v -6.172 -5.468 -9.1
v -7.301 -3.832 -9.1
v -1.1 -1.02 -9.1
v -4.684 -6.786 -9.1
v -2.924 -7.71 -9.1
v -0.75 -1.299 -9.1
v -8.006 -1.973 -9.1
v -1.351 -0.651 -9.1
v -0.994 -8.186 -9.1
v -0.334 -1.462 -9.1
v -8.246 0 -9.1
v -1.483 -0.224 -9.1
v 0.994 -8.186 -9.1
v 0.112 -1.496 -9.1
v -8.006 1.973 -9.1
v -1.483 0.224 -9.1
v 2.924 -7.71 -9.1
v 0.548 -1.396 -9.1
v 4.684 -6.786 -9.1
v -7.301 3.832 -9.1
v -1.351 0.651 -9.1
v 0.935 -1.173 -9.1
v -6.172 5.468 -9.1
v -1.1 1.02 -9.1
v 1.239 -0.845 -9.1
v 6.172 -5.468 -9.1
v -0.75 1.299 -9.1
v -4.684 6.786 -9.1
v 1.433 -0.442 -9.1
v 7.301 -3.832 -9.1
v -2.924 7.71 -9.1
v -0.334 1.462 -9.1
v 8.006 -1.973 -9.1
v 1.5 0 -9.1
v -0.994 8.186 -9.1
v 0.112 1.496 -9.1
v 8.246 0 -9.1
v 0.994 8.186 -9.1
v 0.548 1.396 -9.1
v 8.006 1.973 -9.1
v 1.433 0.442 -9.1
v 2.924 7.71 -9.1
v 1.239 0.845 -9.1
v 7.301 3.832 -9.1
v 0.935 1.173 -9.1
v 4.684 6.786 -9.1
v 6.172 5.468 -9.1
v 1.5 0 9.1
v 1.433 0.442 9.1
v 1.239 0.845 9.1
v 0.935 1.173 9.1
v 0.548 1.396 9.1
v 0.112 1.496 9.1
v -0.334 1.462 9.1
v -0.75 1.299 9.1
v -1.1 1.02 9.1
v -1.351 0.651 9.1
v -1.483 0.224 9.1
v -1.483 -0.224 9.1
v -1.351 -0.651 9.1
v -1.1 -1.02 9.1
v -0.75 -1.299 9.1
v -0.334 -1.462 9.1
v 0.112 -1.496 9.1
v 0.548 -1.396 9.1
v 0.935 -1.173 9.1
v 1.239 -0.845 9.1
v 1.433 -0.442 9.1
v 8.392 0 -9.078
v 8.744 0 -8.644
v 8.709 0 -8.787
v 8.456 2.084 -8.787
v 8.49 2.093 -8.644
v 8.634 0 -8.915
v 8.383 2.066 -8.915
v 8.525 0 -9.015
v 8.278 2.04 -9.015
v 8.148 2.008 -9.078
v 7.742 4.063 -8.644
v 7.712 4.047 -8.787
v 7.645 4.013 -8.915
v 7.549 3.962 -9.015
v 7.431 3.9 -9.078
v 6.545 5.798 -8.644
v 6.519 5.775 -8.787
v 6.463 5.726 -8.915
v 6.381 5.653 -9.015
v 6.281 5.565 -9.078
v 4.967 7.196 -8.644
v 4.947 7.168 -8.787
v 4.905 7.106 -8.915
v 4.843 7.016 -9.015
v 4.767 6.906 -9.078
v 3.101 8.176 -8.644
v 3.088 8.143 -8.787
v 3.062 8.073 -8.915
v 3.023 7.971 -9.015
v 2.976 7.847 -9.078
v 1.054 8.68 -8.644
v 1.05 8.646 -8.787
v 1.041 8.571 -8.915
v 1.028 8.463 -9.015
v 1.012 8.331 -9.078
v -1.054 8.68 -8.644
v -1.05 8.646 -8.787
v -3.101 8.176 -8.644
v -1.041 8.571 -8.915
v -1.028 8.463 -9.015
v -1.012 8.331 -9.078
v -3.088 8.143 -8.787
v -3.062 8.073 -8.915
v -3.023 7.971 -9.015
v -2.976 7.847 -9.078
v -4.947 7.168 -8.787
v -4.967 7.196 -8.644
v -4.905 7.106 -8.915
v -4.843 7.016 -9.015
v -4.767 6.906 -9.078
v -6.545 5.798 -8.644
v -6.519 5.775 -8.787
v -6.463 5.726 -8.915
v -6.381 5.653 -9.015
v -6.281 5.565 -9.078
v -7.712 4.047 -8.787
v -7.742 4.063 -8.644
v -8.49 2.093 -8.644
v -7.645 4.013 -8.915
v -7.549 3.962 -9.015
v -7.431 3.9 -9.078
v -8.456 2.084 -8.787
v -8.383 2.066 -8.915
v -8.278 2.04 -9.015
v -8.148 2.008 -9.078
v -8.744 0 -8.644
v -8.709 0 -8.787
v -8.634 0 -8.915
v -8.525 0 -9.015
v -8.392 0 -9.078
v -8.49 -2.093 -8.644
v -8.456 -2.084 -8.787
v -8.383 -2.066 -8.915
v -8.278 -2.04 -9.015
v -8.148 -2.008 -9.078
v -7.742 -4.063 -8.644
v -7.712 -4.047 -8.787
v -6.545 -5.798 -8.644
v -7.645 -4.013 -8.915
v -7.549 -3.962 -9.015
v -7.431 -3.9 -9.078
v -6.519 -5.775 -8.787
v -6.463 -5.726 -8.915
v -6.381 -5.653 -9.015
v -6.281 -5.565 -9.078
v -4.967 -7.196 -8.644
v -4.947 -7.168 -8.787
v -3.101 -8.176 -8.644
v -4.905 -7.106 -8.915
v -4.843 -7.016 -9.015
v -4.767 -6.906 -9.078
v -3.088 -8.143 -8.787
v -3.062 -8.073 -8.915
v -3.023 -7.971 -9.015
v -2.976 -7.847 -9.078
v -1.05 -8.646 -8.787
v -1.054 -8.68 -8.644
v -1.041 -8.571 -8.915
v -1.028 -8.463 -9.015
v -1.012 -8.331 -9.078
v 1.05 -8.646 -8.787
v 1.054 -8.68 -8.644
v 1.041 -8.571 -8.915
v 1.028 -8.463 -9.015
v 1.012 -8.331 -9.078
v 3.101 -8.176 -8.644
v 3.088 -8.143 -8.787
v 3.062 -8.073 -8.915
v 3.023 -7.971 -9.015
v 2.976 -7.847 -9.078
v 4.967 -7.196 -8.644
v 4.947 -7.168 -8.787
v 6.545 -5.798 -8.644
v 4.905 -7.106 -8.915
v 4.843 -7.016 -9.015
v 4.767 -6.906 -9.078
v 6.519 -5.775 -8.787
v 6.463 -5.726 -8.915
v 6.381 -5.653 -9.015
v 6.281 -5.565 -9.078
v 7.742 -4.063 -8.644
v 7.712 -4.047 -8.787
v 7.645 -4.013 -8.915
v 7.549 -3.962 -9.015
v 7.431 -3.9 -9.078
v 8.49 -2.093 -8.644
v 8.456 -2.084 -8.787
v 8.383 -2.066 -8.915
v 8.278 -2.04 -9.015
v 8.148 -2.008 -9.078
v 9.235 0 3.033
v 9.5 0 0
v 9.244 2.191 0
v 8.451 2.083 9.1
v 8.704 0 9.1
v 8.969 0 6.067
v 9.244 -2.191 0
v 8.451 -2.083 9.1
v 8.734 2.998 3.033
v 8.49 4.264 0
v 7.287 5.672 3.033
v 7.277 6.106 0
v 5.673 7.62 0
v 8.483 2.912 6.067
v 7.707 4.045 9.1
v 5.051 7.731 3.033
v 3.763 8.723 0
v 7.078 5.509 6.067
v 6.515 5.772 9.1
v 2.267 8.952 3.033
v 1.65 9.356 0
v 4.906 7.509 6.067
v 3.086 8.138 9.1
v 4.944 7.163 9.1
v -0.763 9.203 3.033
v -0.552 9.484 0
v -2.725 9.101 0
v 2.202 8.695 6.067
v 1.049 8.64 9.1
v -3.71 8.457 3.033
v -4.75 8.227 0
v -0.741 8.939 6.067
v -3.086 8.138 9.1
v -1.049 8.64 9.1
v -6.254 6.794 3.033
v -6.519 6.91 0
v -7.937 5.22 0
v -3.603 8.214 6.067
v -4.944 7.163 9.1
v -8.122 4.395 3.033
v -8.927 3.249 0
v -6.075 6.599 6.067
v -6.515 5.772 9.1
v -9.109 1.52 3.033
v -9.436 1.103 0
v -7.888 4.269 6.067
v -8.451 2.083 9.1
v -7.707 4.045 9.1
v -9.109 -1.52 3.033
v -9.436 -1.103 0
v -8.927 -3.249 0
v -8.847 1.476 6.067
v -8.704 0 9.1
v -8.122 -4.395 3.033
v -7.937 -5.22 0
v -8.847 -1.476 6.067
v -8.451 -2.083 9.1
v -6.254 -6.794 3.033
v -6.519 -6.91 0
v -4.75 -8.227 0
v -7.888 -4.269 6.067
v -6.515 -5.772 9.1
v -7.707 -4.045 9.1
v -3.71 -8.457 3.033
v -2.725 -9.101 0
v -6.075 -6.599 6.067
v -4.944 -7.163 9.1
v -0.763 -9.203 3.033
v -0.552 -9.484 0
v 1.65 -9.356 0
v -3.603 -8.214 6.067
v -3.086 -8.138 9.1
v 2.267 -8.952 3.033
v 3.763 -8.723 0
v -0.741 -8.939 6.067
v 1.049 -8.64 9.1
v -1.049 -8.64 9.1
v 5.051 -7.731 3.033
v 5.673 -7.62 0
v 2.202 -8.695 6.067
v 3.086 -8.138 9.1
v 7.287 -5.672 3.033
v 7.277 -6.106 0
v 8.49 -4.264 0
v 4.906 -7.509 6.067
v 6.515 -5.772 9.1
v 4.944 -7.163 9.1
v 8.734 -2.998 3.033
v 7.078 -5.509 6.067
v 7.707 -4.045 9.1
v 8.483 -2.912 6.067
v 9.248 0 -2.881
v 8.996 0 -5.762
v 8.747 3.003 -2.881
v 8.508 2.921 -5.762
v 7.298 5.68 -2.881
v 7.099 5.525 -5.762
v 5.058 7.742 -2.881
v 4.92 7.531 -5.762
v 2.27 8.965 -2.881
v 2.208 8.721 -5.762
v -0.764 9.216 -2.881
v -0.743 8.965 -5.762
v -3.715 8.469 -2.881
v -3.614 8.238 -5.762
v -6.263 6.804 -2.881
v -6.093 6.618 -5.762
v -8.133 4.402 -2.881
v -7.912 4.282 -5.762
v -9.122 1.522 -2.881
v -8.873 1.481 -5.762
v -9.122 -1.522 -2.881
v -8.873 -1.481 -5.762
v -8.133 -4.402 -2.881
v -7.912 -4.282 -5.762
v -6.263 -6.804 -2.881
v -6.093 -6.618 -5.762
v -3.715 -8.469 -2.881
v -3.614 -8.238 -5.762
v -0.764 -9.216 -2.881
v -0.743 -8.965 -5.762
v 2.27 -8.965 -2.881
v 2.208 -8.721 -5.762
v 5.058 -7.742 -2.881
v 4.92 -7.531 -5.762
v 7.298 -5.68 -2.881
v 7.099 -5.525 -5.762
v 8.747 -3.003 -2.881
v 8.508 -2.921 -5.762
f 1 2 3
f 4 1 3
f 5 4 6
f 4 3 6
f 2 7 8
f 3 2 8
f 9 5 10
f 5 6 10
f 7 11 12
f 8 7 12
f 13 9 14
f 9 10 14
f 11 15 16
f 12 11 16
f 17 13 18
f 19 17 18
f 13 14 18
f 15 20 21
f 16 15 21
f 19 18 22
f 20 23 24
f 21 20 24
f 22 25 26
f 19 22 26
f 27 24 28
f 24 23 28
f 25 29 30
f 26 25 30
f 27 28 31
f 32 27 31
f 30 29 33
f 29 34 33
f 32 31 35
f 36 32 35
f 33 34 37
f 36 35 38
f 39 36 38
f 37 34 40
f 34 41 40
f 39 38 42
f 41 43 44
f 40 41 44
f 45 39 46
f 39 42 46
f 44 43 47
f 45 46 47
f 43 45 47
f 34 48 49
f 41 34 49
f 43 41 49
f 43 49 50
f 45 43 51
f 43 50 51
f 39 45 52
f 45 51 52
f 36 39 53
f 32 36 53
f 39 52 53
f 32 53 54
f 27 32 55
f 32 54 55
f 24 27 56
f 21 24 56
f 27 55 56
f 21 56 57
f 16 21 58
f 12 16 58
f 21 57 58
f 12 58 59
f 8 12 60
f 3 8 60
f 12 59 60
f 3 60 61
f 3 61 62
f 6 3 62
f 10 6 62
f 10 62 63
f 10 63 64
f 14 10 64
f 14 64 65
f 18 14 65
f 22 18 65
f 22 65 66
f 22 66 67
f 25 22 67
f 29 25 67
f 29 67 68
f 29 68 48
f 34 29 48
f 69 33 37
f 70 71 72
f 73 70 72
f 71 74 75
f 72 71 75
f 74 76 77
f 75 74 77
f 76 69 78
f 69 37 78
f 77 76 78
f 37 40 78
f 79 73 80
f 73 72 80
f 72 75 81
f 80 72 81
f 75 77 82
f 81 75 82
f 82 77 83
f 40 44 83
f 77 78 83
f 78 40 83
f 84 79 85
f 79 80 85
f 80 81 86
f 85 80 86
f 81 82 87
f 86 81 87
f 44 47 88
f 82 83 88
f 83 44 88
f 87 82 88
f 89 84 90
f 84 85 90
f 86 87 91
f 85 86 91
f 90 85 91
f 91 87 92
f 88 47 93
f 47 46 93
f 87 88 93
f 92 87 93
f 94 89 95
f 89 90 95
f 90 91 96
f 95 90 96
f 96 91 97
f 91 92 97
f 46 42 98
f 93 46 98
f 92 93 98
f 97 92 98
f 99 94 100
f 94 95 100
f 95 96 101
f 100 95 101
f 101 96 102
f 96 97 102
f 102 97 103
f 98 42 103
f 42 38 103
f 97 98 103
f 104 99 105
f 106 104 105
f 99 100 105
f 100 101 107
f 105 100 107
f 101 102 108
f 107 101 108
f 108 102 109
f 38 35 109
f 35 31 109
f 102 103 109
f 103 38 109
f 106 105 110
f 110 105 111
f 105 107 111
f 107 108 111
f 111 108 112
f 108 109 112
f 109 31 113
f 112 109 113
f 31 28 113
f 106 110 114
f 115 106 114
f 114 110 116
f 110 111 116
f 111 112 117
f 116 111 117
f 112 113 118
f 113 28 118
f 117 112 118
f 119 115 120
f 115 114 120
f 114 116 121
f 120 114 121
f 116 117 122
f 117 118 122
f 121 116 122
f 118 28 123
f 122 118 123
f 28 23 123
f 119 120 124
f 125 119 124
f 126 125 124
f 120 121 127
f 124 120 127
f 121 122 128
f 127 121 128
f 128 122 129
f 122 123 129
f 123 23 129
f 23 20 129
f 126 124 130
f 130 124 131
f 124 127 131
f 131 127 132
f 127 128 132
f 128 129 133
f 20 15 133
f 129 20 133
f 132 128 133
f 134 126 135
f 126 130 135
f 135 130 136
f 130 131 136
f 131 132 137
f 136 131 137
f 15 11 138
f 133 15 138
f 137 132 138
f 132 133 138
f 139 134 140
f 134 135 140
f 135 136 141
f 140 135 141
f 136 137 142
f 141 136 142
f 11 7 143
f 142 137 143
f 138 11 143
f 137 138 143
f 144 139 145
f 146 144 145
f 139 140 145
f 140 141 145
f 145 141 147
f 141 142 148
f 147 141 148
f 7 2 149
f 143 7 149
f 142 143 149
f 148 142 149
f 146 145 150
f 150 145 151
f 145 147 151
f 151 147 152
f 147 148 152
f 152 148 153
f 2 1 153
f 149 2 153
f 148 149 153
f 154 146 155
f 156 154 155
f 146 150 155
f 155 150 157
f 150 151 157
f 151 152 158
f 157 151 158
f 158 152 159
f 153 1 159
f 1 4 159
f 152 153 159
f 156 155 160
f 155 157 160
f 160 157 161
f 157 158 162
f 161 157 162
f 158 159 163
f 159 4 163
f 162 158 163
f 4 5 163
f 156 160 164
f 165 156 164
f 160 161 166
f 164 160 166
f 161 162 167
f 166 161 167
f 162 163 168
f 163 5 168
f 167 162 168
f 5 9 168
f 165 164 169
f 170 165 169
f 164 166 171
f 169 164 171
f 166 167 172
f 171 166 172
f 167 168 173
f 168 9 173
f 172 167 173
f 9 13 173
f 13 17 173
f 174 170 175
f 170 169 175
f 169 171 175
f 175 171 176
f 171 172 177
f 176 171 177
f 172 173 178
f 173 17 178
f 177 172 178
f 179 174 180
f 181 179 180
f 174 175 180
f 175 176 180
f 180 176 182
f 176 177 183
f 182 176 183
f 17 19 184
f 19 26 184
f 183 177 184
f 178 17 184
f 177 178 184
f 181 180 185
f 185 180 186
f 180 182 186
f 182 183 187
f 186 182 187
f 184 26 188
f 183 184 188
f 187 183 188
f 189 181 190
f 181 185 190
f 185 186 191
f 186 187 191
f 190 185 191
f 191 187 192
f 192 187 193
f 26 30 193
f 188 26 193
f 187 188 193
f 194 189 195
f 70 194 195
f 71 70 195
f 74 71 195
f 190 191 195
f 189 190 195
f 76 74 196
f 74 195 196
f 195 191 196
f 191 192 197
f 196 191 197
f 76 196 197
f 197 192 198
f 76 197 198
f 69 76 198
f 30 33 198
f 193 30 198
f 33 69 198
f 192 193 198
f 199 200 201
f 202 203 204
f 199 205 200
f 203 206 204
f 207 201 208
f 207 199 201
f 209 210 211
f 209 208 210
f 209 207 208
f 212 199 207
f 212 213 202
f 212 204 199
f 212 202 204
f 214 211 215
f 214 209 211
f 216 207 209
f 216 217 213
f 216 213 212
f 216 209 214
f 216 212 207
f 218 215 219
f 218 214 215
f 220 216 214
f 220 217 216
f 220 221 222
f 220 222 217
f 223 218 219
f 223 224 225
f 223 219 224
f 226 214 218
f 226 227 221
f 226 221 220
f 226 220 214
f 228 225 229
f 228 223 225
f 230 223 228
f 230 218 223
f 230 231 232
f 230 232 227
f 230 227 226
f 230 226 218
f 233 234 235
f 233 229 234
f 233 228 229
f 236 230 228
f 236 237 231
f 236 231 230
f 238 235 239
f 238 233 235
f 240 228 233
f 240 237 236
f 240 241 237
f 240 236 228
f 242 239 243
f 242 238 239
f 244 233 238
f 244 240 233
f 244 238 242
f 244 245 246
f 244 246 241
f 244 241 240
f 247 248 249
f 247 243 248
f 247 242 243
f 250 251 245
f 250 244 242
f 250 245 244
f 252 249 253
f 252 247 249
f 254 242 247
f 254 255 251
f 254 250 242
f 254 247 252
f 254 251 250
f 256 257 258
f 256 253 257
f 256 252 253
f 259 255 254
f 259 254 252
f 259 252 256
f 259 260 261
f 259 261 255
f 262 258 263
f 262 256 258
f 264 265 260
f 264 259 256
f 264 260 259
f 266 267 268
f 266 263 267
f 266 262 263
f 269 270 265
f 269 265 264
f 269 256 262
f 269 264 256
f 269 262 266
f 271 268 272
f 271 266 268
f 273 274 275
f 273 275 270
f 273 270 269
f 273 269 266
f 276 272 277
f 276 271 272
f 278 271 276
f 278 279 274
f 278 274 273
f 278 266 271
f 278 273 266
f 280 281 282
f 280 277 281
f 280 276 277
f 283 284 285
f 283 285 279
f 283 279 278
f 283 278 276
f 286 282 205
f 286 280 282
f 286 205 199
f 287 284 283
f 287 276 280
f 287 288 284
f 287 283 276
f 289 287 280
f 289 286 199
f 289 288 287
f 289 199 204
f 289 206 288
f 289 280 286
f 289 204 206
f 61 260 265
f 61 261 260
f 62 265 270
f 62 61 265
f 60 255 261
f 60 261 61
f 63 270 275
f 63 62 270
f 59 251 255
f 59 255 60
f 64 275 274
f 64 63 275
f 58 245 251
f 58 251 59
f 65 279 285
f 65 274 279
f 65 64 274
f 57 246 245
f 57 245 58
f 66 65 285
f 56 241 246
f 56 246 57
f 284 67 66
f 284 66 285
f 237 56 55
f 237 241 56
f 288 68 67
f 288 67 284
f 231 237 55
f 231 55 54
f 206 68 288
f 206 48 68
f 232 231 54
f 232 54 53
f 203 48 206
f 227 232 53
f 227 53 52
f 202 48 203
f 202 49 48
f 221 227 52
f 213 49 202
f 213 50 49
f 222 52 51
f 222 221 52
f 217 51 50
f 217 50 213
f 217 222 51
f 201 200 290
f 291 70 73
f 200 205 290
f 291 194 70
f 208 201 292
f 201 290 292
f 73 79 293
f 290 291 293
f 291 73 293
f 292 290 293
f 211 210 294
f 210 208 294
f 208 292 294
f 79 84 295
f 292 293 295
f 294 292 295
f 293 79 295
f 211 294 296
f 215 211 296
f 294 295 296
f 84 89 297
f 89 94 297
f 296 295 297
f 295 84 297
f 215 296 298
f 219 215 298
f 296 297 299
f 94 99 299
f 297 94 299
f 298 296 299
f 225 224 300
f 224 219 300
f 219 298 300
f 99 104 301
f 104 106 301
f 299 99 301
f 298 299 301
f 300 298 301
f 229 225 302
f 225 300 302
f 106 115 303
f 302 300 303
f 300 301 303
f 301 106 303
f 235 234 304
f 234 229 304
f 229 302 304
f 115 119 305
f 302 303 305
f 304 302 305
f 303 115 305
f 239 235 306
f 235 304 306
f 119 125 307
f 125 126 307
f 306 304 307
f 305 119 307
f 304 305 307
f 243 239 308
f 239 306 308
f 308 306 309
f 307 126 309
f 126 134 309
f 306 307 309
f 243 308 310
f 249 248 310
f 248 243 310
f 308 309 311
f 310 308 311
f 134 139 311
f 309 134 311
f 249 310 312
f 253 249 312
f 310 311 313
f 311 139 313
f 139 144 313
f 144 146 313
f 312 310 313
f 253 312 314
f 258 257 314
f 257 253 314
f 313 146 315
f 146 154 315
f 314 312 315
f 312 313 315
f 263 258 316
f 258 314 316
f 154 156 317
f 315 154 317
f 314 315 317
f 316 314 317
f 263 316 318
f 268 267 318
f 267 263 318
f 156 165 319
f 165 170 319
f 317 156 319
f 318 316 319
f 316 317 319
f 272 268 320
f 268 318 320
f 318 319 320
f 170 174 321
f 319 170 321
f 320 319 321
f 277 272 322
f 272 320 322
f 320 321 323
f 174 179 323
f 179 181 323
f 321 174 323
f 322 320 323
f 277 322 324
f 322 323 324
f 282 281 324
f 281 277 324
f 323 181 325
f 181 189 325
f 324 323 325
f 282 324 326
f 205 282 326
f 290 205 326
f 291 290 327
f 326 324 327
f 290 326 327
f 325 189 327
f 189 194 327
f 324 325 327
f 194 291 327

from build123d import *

# Parameters (mm, degrees)
SKETCH1_R                     = 9.5
BOSS_EXTRUDE1_DEPTH           = 9.1
BOSS_EXTRUDE1_TAPER           = 5
BOSS_EXTRUDE1_OTHER_WAY_DEPTH = 9.1
BOSS_EXTRUDE1_OTHER_WAY_TAPER = 5
FILLET1_R                     = 0.5
SKETCH2_R                     = 1.5
CUT_EXTRUDE1_DEPTH            = 18.5


with BuildPart() as part:
    # Sketch1 → Boss-Extrude1 (new body)
    with BuildSketch(Plane.XY):
        Circle(SKETCH1_R)
    extrude(amount=BOSS_EXTRUDE1_DEPTH, taper=BOSS_EXTRUDE1_TAPER)

    # Sketch1 → Boss-Extrude1 other way (add)
    with BuildSketch(Plane.XY):
        Circle(SKETCH1_R)
    extrude(amount=-BOSS_EXTRUDE1_OTHER_WAY_DEPTH, taper=BOSS_EXTRUDE1_OTHER_WAY_TAPER)

    # Fillet1
    fillet1_edges = [part.edges().sort_by_distance(p)[0] for p in [
        (-8.703853162, 0, -9.1),
    ]]
    fillet(fillet1_edges, radius=FILLET1_R)

    # Sketch2 → Cut-Extrude1 (cut)
    with BuildSketch(Plane.XY.offset(9.1)):
        Circle(SKETCH2_R)
    extrude(amount=-CUT_EXTRUDE1_DEPTH, mode=Mode.SUBTRACT)


solid = part.part
